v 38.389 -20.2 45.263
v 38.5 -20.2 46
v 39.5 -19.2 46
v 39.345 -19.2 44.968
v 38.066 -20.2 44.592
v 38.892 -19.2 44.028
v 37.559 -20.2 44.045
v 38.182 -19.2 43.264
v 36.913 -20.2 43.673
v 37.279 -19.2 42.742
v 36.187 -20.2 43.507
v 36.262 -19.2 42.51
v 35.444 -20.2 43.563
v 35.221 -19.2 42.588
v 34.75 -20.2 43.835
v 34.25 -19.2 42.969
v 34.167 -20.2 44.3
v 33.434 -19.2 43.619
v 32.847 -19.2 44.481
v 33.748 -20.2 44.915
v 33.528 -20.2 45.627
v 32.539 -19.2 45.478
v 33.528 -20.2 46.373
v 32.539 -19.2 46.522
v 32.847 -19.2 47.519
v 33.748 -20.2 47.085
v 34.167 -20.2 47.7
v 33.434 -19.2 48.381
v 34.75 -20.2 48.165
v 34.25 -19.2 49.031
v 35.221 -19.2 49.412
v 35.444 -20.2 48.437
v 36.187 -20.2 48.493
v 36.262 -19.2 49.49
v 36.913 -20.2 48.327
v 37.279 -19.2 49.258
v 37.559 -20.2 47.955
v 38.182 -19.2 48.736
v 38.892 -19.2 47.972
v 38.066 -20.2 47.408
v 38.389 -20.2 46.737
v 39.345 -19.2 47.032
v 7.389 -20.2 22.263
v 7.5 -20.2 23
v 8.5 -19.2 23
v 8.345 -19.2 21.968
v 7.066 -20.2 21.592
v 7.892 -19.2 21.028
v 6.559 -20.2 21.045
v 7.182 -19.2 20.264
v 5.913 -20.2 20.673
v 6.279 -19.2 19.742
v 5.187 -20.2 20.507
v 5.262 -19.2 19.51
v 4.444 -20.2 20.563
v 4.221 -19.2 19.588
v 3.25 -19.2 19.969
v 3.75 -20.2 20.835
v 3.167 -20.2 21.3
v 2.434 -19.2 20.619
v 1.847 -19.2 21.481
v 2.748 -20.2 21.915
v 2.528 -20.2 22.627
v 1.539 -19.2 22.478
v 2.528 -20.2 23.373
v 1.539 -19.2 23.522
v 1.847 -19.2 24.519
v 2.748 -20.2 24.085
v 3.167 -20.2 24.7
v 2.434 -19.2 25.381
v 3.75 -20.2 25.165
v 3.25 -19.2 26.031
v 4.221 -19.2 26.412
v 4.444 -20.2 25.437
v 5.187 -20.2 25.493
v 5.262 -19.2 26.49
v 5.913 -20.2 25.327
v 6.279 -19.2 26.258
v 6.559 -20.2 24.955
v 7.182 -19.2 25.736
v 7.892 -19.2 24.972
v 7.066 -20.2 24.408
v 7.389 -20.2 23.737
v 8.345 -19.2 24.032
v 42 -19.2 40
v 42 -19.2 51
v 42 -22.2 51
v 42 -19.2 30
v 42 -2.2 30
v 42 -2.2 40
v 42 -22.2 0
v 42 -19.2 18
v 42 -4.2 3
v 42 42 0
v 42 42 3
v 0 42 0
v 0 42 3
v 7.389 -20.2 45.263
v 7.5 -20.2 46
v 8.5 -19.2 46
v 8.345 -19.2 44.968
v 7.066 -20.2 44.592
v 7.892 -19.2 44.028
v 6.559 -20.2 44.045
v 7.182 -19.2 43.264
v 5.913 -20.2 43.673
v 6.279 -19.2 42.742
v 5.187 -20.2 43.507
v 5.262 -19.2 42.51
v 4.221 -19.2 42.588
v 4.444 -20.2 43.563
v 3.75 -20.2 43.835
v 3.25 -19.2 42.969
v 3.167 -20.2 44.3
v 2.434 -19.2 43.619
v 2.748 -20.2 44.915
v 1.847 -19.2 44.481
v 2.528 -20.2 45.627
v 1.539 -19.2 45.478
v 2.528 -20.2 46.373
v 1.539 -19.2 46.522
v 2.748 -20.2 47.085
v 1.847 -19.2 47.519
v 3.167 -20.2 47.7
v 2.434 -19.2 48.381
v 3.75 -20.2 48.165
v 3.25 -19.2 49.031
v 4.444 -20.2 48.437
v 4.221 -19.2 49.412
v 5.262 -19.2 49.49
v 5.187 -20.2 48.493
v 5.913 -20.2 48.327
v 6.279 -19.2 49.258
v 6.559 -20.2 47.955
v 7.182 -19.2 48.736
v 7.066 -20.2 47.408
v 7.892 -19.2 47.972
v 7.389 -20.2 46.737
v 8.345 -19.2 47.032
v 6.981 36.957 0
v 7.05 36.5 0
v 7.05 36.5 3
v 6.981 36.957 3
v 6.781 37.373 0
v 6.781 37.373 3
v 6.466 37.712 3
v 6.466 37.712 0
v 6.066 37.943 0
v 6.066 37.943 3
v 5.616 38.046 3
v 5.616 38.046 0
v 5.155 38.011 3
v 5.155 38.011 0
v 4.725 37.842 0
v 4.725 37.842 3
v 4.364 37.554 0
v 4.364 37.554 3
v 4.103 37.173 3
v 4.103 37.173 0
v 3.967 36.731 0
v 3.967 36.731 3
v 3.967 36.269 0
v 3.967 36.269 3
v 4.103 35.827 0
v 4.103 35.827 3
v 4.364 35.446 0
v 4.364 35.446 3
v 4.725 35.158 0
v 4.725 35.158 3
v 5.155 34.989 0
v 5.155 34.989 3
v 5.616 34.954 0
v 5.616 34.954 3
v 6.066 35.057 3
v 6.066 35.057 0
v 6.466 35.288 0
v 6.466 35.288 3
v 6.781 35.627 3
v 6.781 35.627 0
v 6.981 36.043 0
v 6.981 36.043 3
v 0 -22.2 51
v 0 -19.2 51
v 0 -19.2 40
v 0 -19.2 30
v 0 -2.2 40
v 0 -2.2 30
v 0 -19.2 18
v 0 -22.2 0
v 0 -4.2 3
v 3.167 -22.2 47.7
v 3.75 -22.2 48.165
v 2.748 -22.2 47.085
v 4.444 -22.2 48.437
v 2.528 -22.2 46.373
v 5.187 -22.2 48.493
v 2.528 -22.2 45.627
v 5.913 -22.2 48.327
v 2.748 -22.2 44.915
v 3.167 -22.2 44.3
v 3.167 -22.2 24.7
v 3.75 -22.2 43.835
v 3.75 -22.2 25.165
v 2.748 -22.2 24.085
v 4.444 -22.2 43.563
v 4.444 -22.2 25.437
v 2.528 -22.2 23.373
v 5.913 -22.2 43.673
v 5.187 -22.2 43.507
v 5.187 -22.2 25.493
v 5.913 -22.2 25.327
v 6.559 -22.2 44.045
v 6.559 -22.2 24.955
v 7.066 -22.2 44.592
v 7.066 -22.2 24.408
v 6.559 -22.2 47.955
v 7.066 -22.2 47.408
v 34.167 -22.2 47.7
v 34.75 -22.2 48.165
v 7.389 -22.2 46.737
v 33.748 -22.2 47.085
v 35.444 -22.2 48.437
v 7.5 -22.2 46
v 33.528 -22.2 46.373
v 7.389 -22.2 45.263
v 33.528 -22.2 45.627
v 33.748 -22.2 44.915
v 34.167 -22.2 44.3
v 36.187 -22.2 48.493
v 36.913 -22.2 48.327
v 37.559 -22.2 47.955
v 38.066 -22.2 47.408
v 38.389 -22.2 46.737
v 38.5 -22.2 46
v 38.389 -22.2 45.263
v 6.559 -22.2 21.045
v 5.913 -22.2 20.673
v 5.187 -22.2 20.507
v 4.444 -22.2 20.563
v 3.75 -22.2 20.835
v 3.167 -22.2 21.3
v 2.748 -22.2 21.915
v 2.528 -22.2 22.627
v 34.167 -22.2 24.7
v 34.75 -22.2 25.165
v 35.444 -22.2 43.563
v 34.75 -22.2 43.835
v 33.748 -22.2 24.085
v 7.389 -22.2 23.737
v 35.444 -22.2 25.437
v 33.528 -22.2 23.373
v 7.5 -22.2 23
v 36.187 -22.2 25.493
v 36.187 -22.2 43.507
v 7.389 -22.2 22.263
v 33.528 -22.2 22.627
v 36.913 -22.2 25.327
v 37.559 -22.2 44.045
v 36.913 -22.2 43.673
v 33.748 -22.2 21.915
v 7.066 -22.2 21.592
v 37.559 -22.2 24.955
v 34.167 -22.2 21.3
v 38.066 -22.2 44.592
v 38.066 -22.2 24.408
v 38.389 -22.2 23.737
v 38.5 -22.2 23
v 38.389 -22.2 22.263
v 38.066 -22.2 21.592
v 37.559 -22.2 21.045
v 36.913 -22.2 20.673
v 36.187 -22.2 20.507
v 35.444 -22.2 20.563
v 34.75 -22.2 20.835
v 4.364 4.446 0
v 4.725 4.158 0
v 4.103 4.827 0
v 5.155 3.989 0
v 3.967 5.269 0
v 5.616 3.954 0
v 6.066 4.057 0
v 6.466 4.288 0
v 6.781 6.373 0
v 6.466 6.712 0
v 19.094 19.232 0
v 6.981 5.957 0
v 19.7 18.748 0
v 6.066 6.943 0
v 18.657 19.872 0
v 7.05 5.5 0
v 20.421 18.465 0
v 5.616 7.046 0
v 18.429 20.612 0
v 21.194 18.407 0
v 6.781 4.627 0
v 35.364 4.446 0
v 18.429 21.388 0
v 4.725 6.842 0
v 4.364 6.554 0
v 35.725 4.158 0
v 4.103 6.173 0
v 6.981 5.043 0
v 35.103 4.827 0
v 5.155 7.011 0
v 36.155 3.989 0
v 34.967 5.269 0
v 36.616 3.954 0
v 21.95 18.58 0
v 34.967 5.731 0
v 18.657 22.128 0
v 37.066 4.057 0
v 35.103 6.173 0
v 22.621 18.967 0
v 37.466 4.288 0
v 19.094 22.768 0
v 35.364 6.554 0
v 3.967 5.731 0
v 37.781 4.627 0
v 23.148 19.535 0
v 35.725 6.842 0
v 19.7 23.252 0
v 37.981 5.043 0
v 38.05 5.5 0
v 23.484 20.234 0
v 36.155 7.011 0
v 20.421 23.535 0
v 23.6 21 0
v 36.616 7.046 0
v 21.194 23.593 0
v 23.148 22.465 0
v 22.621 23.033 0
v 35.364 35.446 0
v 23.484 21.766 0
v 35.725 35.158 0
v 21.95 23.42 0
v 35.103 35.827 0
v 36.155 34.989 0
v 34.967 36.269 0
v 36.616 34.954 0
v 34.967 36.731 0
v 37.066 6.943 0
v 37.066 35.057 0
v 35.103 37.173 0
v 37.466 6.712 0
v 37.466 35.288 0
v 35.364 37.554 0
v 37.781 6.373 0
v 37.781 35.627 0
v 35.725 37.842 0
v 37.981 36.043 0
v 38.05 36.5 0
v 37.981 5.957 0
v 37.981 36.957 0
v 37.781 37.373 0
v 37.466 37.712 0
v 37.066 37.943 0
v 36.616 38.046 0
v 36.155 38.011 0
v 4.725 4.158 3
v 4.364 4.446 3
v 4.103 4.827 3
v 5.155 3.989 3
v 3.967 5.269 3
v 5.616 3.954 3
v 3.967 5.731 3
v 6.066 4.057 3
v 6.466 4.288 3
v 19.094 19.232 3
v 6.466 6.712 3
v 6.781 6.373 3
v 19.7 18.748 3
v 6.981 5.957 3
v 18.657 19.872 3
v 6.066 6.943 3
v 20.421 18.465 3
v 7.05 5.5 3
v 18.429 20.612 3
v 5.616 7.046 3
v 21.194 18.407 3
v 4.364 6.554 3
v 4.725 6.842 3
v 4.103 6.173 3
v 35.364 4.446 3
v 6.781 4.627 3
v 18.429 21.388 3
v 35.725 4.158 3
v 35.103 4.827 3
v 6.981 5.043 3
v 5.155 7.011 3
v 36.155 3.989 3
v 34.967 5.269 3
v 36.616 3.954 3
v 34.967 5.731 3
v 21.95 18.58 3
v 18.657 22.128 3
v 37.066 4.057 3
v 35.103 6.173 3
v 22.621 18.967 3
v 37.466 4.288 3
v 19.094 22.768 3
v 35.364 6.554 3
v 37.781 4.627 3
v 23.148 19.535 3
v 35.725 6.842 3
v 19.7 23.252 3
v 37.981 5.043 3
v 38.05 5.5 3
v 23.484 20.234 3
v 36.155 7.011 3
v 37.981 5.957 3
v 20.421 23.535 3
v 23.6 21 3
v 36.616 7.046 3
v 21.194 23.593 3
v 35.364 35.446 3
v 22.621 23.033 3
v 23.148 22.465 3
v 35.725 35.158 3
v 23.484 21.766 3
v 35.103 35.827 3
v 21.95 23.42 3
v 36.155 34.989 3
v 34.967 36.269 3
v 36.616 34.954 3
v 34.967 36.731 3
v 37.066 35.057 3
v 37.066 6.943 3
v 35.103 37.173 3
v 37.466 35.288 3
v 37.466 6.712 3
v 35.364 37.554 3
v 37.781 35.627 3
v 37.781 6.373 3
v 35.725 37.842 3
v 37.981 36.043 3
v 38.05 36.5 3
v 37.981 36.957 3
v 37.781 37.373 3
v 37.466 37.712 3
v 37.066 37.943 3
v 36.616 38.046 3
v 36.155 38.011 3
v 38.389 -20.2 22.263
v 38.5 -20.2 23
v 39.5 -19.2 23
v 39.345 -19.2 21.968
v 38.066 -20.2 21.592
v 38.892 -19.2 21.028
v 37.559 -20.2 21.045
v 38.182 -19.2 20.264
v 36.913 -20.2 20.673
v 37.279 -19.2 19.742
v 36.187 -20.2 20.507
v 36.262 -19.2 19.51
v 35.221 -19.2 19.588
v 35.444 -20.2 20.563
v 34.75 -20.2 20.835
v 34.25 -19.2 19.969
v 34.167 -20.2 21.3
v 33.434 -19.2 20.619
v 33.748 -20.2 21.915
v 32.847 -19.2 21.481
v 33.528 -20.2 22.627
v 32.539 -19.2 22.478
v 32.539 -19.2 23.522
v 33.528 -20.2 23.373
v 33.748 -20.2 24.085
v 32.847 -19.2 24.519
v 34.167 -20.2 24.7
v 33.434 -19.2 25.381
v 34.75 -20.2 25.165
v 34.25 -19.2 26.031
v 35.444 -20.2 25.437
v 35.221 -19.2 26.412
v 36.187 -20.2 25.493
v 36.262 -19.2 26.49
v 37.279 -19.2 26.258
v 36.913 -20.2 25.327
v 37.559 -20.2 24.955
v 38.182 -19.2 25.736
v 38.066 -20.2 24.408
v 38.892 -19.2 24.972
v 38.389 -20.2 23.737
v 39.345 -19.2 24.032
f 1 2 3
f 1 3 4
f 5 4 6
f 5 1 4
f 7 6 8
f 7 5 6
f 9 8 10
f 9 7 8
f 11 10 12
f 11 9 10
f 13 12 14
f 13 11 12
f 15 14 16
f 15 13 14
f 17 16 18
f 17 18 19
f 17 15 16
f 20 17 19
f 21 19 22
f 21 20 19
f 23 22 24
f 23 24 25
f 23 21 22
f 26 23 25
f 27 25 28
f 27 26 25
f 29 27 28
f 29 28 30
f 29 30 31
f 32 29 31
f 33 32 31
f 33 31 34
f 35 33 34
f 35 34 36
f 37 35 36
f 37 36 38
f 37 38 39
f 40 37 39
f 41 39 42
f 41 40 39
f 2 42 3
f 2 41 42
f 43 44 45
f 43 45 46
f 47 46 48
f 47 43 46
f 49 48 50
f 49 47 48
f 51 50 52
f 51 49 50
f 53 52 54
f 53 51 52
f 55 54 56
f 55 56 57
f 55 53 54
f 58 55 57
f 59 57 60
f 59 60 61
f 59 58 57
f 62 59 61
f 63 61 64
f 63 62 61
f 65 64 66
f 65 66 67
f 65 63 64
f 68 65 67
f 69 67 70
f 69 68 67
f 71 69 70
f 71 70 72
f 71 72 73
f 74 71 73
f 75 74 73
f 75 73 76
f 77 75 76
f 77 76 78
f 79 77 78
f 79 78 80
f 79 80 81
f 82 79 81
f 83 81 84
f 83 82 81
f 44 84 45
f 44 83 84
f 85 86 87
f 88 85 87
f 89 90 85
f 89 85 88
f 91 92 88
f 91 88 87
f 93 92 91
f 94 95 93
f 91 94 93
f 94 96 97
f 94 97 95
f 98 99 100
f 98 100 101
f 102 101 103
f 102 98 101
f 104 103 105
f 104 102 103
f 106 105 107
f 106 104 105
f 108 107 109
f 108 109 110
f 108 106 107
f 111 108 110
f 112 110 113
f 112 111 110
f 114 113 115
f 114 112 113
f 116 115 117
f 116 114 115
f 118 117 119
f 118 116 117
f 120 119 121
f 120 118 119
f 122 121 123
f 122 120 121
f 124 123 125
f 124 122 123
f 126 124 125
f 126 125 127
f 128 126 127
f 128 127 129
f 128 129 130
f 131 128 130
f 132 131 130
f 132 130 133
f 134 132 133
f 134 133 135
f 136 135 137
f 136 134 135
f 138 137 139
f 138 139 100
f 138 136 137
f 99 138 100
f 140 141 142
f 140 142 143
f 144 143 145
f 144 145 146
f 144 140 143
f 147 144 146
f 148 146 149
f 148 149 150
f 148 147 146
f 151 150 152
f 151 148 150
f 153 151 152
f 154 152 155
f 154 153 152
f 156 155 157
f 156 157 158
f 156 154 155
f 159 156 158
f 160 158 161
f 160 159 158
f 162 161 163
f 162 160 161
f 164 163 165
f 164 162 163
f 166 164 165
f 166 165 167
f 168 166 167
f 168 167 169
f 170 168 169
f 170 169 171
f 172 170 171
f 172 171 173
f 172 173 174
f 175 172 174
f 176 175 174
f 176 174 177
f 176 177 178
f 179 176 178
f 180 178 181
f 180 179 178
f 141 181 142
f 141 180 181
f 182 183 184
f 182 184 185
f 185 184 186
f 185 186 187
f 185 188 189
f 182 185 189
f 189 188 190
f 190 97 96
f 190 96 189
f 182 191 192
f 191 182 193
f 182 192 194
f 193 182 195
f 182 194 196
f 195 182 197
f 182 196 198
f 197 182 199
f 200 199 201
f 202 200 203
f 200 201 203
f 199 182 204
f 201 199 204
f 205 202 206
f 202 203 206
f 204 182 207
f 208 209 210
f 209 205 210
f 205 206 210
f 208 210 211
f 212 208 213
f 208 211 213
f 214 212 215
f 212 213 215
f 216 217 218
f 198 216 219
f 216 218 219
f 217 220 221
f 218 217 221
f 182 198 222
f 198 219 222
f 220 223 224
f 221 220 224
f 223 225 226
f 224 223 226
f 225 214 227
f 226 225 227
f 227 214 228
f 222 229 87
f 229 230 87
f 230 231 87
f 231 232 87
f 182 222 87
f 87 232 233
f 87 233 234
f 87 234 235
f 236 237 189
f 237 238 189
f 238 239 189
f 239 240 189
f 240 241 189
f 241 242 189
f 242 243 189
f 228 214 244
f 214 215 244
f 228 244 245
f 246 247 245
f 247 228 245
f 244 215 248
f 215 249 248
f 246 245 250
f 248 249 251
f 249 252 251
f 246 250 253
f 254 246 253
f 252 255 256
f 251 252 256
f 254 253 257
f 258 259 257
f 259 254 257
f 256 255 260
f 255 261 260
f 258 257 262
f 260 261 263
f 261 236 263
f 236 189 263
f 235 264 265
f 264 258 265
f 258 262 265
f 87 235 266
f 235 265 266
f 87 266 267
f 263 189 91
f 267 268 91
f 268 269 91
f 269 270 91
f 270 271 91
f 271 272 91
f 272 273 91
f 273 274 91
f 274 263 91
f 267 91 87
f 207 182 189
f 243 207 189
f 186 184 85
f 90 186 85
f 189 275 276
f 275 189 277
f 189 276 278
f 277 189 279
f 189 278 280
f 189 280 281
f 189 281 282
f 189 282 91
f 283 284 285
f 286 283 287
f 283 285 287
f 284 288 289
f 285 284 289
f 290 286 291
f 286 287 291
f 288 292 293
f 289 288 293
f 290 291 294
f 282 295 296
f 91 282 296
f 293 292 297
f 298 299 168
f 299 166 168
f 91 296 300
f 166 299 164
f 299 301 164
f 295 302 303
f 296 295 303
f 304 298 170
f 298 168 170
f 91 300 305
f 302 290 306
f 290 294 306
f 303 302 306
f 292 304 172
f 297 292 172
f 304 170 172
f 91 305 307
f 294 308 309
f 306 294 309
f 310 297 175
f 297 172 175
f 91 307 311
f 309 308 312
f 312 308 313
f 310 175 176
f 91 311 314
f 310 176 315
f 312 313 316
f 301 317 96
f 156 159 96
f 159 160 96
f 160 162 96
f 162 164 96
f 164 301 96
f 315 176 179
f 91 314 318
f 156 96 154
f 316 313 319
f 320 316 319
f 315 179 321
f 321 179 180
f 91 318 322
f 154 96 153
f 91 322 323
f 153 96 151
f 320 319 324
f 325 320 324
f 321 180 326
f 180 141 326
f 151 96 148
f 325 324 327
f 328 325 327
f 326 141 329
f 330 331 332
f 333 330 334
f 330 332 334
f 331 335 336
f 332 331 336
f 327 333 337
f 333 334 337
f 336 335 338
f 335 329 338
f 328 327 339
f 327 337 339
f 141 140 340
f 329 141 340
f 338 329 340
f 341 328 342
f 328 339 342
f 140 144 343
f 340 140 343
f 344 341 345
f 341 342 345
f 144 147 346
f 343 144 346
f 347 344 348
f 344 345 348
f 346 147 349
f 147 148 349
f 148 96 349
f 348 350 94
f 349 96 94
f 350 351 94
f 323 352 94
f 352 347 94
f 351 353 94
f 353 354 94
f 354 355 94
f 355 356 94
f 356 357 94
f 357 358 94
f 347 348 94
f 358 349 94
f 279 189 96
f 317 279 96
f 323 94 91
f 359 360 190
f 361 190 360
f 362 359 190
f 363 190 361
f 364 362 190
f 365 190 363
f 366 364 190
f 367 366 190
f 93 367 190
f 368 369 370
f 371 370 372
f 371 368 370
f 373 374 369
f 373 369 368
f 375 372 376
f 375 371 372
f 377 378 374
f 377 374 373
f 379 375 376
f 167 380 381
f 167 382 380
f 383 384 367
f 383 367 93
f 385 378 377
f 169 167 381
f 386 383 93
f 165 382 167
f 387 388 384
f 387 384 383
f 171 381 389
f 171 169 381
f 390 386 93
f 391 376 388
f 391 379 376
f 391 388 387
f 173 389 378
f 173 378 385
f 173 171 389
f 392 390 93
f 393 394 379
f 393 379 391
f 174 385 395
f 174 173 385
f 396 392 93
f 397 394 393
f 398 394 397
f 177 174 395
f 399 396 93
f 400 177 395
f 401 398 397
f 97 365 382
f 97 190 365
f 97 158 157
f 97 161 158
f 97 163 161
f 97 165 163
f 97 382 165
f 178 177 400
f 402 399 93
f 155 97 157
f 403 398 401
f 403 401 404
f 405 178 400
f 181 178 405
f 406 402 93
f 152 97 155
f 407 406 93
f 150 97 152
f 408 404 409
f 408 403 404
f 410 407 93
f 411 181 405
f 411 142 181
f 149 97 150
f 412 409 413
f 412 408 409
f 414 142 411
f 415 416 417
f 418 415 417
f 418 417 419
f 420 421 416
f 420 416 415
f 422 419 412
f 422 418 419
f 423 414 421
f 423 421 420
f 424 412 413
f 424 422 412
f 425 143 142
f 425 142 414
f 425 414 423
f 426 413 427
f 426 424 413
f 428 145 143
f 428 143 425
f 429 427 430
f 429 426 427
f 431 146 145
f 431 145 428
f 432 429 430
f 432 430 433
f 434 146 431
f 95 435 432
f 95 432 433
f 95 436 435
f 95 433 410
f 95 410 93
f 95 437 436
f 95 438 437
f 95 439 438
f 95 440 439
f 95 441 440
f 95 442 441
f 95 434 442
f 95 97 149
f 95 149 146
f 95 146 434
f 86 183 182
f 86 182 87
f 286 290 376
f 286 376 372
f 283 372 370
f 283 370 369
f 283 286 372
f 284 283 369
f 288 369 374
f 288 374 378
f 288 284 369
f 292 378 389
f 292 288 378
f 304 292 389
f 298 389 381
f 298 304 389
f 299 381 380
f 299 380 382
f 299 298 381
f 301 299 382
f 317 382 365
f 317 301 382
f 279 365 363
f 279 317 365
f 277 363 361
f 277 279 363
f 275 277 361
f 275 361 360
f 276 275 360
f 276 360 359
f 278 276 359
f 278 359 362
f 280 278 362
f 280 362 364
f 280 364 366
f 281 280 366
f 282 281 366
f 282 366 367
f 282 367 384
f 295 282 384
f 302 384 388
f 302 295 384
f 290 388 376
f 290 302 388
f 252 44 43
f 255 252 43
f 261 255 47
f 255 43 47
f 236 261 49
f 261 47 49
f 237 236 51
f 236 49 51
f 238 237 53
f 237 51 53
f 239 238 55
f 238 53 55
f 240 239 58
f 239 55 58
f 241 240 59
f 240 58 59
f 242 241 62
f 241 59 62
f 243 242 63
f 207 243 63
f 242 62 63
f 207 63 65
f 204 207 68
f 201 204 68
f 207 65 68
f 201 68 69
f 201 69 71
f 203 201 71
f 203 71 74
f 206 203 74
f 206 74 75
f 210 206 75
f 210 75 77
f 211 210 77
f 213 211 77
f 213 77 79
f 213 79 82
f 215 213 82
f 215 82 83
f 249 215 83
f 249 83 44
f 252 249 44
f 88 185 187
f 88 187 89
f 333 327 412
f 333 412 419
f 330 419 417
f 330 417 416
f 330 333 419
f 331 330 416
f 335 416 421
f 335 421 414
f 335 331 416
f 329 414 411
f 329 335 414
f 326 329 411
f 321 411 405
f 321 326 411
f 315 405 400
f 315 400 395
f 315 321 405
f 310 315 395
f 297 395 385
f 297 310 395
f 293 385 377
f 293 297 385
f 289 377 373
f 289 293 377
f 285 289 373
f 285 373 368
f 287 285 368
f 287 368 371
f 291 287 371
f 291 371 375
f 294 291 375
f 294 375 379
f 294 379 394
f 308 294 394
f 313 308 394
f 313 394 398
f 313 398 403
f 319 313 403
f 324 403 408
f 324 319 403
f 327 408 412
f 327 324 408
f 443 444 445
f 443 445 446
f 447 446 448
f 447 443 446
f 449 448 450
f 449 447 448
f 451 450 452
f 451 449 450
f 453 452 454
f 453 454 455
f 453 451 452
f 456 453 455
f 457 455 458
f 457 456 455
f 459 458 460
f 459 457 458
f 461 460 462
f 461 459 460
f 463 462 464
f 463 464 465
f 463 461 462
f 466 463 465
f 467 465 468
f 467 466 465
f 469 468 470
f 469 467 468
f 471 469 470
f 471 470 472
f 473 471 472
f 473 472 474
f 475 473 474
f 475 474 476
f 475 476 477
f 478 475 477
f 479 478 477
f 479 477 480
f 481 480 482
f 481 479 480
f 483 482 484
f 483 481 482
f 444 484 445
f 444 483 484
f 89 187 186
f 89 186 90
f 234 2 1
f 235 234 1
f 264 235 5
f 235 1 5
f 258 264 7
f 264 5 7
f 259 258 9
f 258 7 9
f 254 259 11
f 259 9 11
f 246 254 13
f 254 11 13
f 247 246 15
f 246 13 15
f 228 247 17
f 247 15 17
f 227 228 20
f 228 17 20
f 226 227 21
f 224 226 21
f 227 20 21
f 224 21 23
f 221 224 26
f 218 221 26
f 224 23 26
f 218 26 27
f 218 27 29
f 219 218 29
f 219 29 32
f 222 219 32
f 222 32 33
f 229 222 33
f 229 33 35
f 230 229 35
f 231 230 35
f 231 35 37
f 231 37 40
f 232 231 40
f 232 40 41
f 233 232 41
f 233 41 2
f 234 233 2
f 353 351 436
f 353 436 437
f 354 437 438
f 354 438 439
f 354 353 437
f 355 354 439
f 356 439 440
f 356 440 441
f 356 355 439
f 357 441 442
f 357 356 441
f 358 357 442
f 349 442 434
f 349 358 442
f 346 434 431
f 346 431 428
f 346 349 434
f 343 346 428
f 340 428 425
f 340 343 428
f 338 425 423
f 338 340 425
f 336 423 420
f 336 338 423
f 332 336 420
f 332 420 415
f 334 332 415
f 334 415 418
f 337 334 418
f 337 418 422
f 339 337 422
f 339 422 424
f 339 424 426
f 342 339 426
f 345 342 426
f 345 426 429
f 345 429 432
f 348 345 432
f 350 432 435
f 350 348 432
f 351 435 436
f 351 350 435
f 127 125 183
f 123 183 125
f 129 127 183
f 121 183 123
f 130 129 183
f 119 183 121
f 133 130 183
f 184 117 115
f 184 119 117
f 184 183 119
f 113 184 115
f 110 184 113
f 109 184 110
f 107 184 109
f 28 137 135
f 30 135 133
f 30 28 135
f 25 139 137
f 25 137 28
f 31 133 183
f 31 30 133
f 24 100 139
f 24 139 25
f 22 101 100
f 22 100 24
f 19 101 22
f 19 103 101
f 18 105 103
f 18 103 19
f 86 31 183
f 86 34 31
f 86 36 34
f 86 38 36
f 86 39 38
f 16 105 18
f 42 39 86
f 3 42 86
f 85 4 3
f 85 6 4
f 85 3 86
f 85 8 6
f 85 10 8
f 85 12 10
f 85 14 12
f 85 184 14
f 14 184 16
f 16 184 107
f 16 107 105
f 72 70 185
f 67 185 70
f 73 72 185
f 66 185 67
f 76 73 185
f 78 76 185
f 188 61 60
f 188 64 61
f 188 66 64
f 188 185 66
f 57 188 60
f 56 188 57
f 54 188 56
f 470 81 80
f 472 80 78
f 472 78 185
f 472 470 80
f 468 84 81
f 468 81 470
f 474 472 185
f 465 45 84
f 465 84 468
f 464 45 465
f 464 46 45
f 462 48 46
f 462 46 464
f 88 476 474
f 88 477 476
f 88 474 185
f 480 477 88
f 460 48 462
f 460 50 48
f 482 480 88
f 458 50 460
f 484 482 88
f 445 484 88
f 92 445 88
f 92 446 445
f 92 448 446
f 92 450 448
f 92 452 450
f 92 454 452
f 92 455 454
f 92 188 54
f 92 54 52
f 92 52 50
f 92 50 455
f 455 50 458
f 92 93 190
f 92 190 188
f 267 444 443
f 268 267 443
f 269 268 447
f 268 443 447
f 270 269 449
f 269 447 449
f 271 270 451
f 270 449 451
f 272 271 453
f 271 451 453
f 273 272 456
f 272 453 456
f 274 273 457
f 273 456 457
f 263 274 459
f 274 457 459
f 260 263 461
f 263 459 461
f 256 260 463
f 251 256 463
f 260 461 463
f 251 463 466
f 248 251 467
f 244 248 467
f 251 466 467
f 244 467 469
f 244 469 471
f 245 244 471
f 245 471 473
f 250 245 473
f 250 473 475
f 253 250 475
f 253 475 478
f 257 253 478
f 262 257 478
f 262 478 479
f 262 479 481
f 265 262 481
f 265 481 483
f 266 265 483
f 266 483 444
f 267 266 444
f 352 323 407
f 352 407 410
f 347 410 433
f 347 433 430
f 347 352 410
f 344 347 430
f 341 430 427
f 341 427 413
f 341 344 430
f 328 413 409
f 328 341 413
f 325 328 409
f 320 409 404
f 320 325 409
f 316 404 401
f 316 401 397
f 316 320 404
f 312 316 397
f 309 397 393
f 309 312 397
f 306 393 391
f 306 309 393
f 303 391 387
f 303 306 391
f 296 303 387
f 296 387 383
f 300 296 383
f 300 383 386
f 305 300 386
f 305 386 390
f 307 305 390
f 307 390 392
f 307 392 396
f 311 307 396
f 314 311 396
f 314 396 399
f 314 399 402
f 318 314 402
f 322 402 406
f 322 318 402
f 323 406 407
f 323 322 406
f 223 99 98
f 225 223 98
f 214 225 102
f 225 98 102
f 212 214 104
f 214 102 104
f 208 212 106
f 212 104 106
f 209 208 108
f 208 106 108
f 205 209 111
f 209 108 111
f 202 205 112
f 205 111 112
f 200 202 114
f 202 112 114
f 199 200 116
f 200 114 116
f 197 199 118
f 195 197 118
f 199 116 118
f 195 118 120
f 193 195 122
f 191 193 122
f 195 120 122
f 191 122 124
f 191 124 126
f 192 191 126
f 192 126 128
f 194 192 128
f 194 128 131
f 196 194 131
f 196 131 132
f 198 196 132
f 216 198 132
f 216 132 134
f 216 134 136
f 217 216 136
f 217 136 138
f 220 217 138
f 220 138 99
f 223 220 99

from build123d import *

# Parameters (mm, degrees)
ESQUISSE1_W             = 42
ESQUISSE1_H             = 42
ESQUISSE1_R             = 2.6
ESQUISSE1_R_2           = 1.55
ESQUISSE1_H_2           = 22.2
BOSS_EXTRU_1_DEPTH      = 3
ESQUISSE2_W             = 42
ESQUISSE2_H             = 3
BOSS_EXTRU_2_DEPTH      = 48
BOSS_EXTRU_3_DEPTH      = 42
ENL_V_MAT_EXTRU_4_REACH = 5
ESQUISSE4_R             = 2.5
CHANFREIN1_SIZE         = 1
ESQUISSE5_W             = 42
ESQUISSE5_H             = 10
BOSS_EXTRU_4_DEPTH      = 17


with BuildPart() as part:
    # Esquisse1 → Boss.-Extru.1 (new body)
    with BuildSketch(Plane.XY):
        with Locations((21, 21)):
            Rectangle(ESQUISSE1_W, ESQUISSE1_H)
        with Locations((21, 21)):
            Circle(ESQUISSE1_R, mode=Mode.SUBTRACT)
        with Locations((5.5, 36.5)):
            Circle(ESQUISSE1_R_2, mode=Mode.SUBTRACT)
        with Locations((36.5, 36.5)):
            Circle(ESQUISSE1_R_2, mode=Mode.SUBTRACT)
        with Locations((36.5, 5.5)):
            Circle(ESQUISSE1_R_2, mode=Mode.SUBTRACT)
        with Locations((5.5, 5.5)):
            Circle(ESQUISSE1_R_2, mode=Mode.SUBTRACT)
        with Locations((21, -11.1)):
            Rectangle(ESQUISSE1_W, ESQUISSE1_H_2)
    extrude(amount=BOSS_EXTRU_1_DEPTH)

    # Esquisse2 → Boss.-Extru.2 (add)
    with BuildSketch(Plane.XY.offset(3)):
        with Locations((21, -20.7)):
            Rectangle(ESQUISSE2_W, ESQUISSE2_H)
    extrude(amount=BOSS_EXTRU_2_DEPTH)

    # Esquisse3 → Boss.-Extru.3 (add)
    with BuildSketch(Plane(origin=(42, 0, 0), x_dir=(0, 0, -1), z_dir=(1, 0, 0))):
        Polygon((-3, -4.2), (-18, -19.2), (-3, -19.2), align=None)
    extrude(amount=-BOSS_EXTRU_3_DEPTH)

    # Esquisse4 → Enlèv. mat.-Extru.4 (cut, up to next)
    with BuildSketch(Plane(origin=(0, -19.2, 0), x_dir=(1, 0, 0), z_dir=(0, 1, 0)), mode=Mode.PRIVATE) as enl_v_mat_extru_4_sk1:
        with Locations((5, -23)):
            Circle(ESQUISSE4_R)
    enl_v_mat_extru_4_tool1 = extrude(enl_v_mat_extru_4_sk1.sketch, amount=-ENL_V_MAT_EXTRU_4_REACH, mode=Mode.PRIVATE) & part.part
    add(enl_v_mat_extru_4_tool1.solids().sort_by_distance((5, -19.2, 23))[0], mode=Mode.SUBTRACT)
    # Esquisse4 → Enlèv. mat.-Extru.4 (cut, up to next)
    with BuildSketch(Plane(origin=(0, -19.2, 0), x_dir=(1, 0, 0), z_dir=(0, 1, 0)), mode=Mode.PRIVATE) as enl_v_mat_extru_4_sk2:
        with Locations((36, -23)):
            Circle(ESQUISSE4_R)
    enl_v_mat_extru_4_tool2 = extrude(enl_v_mat_extru_4_sk2.sketch, amount=-ENL_V_MAT_EXTRU_4_REACH, mode=Mode.PRIVATE) & part.part
    add(enl_v_mat_extru_4_tool2.solids().sort_by_distance((36, -19.2, 23))[0], mode=Mode.SUBTRACT)
    # Esquisse4 → Enlèv. mat.-Extru.4 (cut, up to next)
    with BuildSketch(Plane(origin=(0, -19.2, 0), x_dir=(1, 0, 0), z_dir=(0, 1, 0)), mode=Mode.PRIVATE) as enl_v_mat_extru_4_sk3:
        with Locations((36, -46)):
            Circle(ESQUISSE4_R)
    enl_v_mat_extru_4_tool3 = extrude(enl_v_mat_extru_4_sk3.sketch, amount=-ENL_V_MAT_EXTRU_4_REACH, mode=Mode.PRIVATE) & part.part
    add(enl_v_mat_extru_4_tool3.solids().sort_by_distance((36, -19.2, 46))[0], mode=Mode.SUBTRACT)
    # Esquisse4 → Enlèv. mat.-Extru.4 (cut, up to next)
    with BuildSketch(Plane(origin=(0, -19.2, 0), x_dir=(1, 0, 0), z_dir=(0, 1, 0)), mode=Mode.PRIVATE) as enl_v_mat_extru_4_sk4:
        with Locations((5, -46)):
            Circle(ESQUISSE4_R)
    enl_v_mat_extru_4_tool4 = extrude(enl_v_mat_extru_4_sk4.sketch, amount=-ENL_V_MAT_EXTRU_4_REACH, mode=Mode.PRIVATE) & part.part
    add(enl_v_mat_extru_4_tool4.solids().sort_by_distance((5, -19.2, 46))[0], mode=Mode.SUBTRACT)

    # Chanfrein1
    chanfrein1_edges = [part.edges().sort_by_distance(p)[0] for p in [
        (2.5, -19.2, 46),
        (33.5, -19.2, 46),
        (33.5, -19.2, 23),
        (2.5, -19.2, 23),
    ]]
    chamfer(chanfrein1_edges, length=CHANFREIN1_SIZE)

    # Esquisse5 → Boss.-Extru.4 (add)
    with BuildSketch(Plane(origin=(0, -19.2, 0), x_dir=(1, 0, 0), z_dir=(0, 1, 0))):
        with Locations((21, -35)):
            Rectangle(ESQUISSE5_W, ESQUISSE5_H)
    extrude(amount=BOSS_EXTRU_4_DEPTH)


solid = part.part
